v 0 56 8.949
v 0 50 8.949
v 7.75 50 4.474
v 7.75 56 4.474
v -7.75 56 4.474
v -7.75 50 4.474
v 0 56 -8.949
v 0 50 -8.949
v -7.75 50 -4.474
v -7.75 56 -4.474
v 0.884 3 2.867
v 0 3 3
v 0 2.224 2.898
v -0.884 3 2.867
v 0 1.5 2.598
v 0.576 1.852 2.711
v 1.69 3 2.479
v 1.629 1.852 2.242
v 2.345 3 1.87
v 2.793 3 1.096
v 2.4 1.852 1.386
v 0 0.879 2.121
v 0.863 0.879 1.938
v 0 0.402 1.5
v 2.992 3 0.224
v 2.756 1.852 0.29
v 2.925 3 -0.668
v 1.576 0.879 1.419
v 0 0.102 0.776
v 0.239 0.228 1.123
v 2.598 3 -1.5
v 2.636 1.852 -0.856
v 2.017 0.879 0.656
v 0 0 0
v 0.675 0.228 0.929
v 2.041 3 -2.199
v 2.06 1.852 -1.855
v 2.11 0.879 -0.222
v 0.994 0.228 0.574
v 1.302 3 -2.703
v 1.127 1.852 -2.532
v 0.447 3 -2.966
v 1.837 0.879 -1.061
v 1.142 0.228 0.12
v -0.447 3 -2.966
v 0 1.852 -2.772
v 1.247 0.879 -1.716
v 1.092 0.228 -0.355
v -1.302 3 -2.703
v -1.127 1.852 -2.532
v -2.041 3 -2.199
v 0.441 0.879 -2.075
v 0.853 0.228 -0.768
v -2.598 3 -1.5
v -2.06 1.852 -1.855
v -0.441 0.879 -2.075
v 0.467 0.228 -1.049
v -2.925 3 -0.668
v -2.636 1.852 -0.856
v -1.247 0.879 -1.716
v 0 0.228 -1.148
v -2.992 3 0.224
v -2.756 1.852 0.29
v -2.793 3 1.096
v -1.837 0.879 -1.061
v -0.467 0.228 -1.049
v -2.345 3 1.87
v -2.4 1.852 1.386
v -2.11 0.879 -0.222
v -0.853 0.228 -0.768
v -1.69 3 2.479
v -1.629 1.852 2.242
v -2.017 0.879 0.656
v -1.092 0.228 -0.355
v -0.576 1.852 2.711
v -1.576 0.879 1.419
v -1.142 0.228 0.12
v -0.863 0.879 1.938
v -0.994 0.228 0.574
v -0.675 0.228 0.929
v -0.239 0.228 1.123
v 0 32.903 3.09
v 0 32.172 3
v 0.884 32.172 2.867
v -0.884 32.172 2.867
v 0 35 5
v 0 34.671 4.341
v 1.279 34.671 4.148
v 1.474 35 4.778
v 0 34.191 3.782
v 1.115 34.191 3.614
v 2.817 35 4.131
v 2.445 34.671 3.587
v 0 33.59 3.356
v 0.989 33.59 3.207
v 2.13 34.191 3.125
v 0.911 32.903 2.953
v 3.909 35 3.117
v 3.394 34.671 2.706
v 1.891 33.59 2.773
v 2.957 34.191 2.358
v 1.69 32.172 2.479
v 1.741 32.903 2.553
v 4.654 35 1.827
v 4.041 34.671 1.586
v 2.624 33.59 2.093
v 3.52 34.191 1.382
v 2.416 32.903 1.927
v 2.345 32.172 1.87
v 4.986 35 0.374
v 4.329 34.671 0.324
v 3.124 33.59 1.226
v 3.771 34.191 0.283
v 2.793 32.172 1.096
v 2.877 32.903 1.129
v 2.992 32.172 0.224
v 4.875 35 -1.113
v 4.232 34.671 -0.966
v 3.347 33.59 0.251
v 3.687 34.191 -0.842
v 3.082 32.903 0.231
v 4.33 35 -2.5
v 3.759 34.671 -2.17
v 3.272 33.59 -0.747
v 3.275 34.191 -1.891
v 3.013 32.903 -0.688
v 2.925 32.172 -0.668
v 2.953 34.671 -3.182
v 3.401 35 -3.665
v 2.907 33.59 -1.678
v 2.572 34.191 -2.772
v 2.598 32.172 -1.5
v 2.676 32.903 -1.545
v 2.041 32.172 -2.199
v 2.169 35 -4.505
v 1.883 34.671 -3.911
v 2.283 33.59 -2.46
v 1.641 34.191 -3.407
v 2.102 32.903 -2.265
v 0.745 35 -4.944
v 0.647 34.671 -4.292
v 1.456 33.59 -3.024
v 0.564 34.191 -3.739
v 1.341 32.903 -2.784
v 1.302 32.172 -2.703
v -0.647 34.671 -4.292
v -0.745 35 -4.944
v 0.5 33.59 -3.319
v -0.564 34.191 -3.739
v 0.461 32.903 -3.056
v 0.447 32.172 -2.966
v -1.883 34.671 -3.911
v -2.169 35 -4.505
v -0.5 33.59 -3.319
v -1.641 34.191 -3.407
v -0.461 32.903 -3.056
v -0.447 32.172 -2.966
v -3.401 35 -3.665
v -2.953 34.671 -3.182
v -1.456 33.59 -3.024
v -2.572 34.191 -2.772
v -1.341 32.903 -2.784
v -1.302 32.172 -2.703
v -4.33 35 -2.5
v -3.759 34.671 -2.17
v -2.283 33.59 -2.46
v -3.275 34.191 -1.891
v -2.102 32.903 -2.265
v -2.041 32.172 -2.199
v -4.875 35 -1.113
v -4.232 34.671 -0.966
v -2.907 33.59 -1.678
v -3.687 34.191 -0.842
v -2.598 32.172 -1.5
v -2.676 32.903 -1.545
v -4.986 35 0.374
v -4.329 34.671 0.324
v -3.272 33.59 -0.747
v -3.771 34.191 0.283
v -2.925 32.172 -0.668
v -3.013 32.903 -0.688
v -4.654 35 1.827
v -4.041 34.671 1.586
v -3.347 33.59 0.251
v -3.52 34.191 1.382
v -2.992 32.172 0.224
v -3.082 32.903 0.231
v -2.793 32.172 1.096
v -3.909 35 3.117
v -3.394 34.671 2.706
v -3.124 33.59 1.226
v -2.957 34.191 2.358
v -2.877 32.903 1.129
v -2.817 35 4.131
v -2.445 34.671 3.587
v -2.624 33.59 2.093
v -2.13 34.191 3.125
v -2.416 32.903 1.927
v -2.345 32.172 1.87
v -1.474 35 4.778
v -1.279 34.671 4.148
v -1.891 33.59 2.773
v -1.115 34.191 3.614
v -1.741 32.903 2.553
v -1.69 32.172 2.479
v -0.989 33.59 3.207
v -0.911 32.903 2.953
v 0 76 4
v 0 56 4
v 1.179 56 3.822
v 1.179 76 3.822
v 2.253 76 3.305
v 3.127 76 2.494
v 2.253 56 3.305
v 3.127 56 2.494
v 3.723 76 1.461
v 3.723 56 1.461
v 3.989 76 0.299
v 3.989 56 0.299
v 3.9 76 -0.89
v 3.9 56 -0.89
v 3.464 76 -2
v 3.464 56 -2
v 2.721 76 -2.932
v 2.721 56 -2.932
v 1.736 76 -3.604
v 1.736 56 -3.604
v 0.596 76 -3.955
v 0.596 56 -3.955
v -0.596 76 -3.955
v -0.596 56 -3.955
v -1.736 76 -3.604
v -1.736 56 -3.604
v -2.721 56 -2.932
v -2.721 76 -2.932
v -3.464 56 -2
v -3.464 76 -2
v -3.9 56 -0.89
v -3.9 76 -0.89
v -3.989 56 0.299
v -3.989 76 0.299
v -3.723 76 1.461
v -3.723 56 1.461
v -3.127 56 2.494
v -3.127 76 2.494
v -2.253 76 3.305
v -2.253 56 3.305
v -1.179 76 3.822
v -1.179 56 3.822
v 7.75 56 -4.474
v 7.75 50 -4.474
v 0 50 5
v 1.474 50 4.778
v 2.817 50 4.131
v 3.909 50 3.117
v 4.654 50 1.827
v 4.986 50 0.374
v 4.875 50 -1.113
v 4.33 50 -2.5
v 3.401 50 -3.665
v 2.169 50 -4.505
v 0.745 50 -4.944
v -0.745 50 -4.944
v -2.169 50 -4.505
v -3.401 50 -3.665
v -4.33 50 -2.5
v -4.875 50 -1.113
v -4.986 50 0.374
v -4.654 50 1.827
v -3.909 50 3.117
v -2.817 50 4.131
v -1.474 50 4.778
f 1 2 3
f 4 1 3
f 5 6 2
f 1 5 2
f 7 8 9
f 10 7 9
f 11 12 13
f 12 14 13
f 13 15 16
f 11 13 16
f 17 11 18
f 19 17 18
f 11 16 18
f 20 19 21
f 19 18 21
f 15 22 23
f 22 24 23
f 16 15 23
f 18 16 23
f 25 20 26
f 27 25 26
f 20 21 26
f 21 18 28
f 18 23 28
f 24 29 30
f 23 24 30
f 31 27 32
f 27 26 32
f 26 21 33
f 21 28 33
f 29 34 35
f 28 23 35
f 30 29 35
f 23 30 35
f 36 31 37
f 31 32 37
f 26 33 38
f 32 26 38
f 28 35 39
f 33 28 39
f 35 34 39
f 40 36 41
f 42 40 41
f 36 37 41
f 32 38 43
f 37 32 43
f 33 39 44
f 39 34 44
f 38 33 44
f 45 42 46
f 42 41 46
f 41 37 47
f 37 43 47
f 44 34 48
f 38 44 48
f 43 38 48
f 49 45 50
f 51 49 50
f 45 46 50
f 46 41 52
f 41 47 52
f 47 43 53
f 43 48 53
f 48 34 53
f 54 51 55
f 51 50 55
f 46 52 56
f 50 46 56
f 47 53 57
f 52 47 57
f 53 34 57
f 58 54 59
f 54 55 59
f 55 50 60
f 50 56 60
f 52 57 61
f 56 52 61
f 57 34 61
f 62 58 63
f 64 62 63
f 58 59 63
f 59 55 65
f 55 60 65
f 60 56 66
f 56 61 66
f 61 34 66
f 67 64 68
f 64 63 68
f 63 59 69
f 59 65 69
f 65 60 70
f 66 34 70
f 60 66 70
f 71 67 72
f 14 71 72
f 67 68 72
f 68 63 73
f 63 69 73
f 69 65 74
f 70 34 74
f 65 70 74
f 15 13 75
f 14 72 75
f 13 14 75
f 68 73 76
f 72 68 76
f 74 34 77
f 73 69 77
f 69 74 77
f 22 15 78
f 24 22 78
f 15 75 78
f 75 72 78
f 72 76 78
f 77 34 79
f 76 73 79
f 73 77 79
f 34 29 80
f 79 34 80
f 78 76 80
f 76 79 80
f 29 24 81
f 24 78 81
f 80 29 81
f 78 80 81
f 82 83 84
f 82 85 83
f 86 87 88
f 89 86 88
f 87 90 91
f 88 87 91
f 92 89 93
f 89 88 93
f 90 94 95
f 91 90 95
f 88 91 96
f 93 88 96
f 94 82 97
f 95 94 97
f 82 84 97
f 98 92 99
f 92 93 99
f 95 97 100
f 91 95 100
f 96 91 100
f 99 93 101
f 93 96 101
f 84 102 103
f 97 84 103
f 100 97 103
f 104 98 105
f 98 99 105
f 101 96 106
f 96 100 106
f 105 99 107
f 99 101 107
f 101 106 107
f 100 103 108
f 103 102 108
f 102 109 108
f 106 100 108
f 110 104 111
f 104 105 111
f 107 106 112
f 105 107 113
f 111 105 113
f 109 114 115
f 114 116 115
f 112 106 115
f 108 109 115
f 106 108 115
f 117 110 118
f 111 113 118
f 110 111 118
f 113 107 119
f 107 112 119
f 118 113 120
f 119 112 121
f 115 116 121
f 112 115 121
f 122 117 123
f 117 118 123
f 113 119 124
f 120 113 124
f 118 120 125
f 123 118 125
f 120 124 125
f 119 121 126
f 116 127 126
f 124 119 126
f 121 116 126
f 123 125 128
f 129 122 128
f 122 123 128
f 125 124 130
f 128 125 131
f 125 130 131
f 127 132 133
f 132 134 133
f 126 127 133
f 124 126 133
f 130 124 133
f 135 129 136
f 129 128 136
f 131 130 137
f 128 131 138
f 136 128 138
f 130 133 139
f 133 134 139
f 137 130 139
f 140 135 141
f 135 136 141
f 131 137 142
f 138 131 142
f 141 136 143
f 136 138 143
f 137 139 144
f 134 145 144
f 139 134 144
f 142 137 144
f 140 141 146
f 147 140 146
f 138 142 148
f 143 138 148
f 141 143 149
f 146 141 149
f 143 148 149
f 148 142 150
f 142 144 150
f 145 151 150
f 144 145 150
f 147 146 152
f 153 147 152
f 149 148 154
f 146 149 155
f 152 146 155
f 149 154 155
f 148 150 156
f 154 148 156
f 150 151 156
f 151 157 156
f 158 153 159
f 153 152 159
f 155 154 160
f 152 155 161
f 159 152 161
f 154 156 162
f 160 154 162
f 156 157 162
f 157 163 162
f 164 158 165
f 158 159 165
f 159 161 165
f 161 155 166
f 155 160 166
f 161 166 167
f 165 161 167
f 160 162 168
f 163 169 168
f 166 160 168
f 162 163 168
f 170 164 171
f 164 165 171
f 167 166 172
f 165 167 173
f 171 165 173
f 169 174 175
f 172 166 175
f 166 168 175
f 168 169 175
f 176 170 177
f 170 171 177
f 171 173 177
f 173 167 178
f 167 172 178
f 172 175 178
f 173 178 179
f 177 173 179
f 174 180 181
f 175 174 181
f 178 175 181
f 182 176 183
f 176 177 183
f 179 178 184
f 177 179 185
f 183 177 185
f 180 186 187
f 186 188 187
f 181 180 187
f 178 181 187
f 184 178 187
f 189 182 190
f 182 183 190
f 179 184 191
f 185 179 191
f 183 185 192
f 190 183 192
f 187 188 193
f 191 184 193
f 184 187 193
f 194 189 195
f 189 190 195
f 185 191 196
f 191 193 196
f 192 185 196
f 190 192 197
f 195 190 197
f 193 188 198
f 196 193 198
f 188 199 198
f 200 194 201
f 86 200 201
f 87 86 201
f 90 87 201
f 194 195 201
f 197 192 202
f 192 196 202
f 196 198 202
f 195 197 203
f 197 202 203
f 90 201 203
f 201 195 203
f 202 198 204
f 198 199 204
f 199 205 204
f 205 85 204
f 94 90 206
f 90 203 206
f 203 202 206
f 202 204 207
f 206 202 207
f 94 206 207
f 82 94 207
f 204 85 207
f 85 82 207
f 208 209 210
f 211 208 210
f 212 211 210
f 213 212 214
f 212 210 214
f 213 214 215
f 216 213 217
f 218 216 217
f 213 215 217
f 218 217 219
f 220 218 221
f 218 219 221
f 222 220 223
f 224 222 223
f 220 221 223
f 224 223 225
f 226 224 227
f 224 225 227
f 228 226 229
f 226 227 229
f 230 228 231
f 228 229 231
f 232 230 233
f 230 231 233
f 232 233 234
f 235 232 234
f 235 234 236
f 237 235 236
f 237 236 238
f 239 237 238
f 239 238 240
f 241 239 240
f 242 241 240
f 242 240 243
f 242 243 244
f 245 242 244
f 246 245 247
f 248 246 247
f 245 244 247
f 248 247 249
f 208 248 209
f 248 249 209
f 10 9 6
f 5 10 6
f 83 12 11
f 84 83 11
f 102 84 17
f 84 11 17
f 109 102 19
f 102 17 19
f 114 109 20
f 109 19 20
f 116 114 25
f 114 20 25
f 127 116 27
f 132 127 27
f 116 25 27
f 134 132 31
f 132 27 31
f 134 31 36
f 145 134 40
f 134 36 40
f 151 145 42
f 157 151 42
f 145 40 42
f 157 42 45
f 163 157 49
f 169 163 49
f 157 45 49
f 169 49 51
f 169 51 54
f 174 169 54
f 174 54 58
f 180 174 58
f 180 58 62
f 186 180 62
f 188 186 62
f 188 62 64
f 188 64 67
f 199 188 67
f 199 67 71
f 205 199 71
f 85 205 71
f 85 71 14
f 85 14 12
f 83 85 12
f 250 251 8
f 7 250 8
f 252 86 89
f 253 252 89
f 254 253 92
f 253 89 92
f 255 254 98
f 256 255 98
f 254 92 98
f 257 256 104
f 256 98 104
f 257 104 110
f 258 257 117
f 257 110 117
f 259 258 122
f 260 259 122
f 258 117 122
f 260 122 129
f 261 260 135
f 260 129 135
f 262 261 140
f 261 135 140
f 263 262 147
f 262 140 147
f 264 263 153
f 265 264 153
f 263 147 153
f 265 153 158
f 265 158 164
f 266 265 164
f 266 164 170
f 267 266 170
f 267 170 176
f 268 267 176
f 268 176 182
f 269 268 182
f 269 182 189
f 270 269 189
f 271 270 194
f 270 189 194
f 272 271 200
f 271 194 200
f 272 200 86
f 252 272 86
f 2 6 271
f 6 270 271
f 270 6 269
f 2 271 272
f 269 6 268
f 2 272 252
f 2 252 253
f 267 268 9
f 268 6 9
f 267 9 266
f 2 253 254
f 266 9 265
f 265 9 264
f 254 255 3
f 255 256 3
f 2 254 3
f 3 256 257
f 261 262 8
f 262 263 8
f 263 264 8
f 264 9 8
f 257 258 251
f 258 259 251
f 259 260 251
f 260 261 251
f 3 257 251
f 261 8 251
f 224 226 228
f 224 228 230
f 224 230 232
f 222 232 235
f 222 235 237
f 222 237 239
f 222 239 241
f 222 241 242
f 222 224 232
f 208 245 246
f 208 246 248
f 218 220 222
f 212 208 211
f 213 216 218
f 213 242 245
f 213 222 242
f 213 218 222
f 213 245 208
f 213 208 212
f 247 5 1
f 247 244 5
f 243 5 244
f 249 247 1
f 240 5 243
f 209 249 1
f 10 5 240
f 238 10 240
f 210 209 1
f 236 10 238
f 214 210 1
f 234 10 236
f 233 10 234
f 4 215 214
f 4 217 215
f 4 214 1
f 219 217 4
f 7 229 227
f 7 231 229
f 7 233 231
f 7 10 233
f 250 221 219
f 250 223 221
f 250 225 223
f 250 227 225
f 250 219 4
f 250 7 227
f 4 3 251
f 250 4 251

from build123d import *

# Parameters (mm, degrees)
SKETCH1_R           = 3
BOSS_EXTRUDE1_DEPTH = 35
FILLET1_R           = 3
SKETCH2_R           = 5
BOSS_EXTRUDE2_DEPTH = 15
BOSS_EXTRUDE3_DEPTH = 6
SKETCH4_R           = 4
BOSS_EXTRUDE4_DEPTH = 20
FILLET2_R           = 3


with BuildPart() as part:
    # Sketch1 → Boss-Extrude1 (new body)
    with BuildSketch(Plane(origin=(0, 0, 0), x_dir=(1, 0, 0), z_dir=(0, 1, 0))):
        with Locations(Location((0, 0, 0), (0, 0, 270))):
            Circle(SKETCH1_R)
    extrude(amount=BOSS_EXTRUDE1_DEPTH)

    # Fillet1
    fillet1_edges = [part.edges().sort_by_distance(p)[0] for p in [
        (0, 0, -3),
    ]]
    fillet(fillet1_edges, radius=FILLET1_R)

    # Sketch2 → Boss-Extrude2 (add)
    with BuildSketch(Plane(origin=(0, 35, 0), x_dir=(1, 0, 0), z_dir=(0, 1, 0))):
        with Locations(Location((0, 0, 0), (0, 0, 270))):
            Circle(SKETCH2_R)
    extrude(amount=BOSS_EXTRUDE2_DEPTH)

    # Sketch3 → Boss-Extrude3 (add)
    with BuildSketch(Plane(origin=(0, 50, 0), x_dir=(1, 0, 0), z_dir=(0, 1, 0))):
        Polygon((7.75, -4.474464586), (7.75, 4.474464586), (0, 8.948929172), (-7.75, 4.474464586), (-7.75, -4.474464586), (0, -8.948929172), align=None)
    extrude(amount=BOSS_EXTRUDE3_DEPTH)

    # Sketch4 → Boss-Extrude4 (add)
    with BuildSketch(Plane(origin=(0, 56, 0), x_dir=(1, 0, 0), z_dir=(0, 1, 0))):
        with Locations(Location((0, 0, 0), (0, 0, 270))):
            Circle(SKETCH4_R)
    extrude(amount=BOSS_EXTRUDE4_DEPTH)

    # Fillet2
    # the kernel refuses this fillet: 3 mm, written as the material it adds along each edge
    with BuildSketch(Plane(origin=(0, 35, 0), x_dir=(0, 0, 1), z_dir=(-1, 0, 0))) as fillet2_piece_1:
        with BuildLine():
            CenterArc((6, -2.828427125), FILLET2_R, 109.471220634, 70.528779366)
            Line((3, -2.828427125), (2.94, -2.828427125))
            Line((2.94, -2.828427125), (2.94, 0))
            Line((2.94, 0), (3, 0.06))
            ThreePointArc((3, 0.06), (4, 0.06), (4.98, 0.056568542))
            Line((4.98, 0.056568542), (5, 0))
        make_face()
    revolve(axis=Axis((0, 35, 0), (0, 1, 0)))


solid = part.part
